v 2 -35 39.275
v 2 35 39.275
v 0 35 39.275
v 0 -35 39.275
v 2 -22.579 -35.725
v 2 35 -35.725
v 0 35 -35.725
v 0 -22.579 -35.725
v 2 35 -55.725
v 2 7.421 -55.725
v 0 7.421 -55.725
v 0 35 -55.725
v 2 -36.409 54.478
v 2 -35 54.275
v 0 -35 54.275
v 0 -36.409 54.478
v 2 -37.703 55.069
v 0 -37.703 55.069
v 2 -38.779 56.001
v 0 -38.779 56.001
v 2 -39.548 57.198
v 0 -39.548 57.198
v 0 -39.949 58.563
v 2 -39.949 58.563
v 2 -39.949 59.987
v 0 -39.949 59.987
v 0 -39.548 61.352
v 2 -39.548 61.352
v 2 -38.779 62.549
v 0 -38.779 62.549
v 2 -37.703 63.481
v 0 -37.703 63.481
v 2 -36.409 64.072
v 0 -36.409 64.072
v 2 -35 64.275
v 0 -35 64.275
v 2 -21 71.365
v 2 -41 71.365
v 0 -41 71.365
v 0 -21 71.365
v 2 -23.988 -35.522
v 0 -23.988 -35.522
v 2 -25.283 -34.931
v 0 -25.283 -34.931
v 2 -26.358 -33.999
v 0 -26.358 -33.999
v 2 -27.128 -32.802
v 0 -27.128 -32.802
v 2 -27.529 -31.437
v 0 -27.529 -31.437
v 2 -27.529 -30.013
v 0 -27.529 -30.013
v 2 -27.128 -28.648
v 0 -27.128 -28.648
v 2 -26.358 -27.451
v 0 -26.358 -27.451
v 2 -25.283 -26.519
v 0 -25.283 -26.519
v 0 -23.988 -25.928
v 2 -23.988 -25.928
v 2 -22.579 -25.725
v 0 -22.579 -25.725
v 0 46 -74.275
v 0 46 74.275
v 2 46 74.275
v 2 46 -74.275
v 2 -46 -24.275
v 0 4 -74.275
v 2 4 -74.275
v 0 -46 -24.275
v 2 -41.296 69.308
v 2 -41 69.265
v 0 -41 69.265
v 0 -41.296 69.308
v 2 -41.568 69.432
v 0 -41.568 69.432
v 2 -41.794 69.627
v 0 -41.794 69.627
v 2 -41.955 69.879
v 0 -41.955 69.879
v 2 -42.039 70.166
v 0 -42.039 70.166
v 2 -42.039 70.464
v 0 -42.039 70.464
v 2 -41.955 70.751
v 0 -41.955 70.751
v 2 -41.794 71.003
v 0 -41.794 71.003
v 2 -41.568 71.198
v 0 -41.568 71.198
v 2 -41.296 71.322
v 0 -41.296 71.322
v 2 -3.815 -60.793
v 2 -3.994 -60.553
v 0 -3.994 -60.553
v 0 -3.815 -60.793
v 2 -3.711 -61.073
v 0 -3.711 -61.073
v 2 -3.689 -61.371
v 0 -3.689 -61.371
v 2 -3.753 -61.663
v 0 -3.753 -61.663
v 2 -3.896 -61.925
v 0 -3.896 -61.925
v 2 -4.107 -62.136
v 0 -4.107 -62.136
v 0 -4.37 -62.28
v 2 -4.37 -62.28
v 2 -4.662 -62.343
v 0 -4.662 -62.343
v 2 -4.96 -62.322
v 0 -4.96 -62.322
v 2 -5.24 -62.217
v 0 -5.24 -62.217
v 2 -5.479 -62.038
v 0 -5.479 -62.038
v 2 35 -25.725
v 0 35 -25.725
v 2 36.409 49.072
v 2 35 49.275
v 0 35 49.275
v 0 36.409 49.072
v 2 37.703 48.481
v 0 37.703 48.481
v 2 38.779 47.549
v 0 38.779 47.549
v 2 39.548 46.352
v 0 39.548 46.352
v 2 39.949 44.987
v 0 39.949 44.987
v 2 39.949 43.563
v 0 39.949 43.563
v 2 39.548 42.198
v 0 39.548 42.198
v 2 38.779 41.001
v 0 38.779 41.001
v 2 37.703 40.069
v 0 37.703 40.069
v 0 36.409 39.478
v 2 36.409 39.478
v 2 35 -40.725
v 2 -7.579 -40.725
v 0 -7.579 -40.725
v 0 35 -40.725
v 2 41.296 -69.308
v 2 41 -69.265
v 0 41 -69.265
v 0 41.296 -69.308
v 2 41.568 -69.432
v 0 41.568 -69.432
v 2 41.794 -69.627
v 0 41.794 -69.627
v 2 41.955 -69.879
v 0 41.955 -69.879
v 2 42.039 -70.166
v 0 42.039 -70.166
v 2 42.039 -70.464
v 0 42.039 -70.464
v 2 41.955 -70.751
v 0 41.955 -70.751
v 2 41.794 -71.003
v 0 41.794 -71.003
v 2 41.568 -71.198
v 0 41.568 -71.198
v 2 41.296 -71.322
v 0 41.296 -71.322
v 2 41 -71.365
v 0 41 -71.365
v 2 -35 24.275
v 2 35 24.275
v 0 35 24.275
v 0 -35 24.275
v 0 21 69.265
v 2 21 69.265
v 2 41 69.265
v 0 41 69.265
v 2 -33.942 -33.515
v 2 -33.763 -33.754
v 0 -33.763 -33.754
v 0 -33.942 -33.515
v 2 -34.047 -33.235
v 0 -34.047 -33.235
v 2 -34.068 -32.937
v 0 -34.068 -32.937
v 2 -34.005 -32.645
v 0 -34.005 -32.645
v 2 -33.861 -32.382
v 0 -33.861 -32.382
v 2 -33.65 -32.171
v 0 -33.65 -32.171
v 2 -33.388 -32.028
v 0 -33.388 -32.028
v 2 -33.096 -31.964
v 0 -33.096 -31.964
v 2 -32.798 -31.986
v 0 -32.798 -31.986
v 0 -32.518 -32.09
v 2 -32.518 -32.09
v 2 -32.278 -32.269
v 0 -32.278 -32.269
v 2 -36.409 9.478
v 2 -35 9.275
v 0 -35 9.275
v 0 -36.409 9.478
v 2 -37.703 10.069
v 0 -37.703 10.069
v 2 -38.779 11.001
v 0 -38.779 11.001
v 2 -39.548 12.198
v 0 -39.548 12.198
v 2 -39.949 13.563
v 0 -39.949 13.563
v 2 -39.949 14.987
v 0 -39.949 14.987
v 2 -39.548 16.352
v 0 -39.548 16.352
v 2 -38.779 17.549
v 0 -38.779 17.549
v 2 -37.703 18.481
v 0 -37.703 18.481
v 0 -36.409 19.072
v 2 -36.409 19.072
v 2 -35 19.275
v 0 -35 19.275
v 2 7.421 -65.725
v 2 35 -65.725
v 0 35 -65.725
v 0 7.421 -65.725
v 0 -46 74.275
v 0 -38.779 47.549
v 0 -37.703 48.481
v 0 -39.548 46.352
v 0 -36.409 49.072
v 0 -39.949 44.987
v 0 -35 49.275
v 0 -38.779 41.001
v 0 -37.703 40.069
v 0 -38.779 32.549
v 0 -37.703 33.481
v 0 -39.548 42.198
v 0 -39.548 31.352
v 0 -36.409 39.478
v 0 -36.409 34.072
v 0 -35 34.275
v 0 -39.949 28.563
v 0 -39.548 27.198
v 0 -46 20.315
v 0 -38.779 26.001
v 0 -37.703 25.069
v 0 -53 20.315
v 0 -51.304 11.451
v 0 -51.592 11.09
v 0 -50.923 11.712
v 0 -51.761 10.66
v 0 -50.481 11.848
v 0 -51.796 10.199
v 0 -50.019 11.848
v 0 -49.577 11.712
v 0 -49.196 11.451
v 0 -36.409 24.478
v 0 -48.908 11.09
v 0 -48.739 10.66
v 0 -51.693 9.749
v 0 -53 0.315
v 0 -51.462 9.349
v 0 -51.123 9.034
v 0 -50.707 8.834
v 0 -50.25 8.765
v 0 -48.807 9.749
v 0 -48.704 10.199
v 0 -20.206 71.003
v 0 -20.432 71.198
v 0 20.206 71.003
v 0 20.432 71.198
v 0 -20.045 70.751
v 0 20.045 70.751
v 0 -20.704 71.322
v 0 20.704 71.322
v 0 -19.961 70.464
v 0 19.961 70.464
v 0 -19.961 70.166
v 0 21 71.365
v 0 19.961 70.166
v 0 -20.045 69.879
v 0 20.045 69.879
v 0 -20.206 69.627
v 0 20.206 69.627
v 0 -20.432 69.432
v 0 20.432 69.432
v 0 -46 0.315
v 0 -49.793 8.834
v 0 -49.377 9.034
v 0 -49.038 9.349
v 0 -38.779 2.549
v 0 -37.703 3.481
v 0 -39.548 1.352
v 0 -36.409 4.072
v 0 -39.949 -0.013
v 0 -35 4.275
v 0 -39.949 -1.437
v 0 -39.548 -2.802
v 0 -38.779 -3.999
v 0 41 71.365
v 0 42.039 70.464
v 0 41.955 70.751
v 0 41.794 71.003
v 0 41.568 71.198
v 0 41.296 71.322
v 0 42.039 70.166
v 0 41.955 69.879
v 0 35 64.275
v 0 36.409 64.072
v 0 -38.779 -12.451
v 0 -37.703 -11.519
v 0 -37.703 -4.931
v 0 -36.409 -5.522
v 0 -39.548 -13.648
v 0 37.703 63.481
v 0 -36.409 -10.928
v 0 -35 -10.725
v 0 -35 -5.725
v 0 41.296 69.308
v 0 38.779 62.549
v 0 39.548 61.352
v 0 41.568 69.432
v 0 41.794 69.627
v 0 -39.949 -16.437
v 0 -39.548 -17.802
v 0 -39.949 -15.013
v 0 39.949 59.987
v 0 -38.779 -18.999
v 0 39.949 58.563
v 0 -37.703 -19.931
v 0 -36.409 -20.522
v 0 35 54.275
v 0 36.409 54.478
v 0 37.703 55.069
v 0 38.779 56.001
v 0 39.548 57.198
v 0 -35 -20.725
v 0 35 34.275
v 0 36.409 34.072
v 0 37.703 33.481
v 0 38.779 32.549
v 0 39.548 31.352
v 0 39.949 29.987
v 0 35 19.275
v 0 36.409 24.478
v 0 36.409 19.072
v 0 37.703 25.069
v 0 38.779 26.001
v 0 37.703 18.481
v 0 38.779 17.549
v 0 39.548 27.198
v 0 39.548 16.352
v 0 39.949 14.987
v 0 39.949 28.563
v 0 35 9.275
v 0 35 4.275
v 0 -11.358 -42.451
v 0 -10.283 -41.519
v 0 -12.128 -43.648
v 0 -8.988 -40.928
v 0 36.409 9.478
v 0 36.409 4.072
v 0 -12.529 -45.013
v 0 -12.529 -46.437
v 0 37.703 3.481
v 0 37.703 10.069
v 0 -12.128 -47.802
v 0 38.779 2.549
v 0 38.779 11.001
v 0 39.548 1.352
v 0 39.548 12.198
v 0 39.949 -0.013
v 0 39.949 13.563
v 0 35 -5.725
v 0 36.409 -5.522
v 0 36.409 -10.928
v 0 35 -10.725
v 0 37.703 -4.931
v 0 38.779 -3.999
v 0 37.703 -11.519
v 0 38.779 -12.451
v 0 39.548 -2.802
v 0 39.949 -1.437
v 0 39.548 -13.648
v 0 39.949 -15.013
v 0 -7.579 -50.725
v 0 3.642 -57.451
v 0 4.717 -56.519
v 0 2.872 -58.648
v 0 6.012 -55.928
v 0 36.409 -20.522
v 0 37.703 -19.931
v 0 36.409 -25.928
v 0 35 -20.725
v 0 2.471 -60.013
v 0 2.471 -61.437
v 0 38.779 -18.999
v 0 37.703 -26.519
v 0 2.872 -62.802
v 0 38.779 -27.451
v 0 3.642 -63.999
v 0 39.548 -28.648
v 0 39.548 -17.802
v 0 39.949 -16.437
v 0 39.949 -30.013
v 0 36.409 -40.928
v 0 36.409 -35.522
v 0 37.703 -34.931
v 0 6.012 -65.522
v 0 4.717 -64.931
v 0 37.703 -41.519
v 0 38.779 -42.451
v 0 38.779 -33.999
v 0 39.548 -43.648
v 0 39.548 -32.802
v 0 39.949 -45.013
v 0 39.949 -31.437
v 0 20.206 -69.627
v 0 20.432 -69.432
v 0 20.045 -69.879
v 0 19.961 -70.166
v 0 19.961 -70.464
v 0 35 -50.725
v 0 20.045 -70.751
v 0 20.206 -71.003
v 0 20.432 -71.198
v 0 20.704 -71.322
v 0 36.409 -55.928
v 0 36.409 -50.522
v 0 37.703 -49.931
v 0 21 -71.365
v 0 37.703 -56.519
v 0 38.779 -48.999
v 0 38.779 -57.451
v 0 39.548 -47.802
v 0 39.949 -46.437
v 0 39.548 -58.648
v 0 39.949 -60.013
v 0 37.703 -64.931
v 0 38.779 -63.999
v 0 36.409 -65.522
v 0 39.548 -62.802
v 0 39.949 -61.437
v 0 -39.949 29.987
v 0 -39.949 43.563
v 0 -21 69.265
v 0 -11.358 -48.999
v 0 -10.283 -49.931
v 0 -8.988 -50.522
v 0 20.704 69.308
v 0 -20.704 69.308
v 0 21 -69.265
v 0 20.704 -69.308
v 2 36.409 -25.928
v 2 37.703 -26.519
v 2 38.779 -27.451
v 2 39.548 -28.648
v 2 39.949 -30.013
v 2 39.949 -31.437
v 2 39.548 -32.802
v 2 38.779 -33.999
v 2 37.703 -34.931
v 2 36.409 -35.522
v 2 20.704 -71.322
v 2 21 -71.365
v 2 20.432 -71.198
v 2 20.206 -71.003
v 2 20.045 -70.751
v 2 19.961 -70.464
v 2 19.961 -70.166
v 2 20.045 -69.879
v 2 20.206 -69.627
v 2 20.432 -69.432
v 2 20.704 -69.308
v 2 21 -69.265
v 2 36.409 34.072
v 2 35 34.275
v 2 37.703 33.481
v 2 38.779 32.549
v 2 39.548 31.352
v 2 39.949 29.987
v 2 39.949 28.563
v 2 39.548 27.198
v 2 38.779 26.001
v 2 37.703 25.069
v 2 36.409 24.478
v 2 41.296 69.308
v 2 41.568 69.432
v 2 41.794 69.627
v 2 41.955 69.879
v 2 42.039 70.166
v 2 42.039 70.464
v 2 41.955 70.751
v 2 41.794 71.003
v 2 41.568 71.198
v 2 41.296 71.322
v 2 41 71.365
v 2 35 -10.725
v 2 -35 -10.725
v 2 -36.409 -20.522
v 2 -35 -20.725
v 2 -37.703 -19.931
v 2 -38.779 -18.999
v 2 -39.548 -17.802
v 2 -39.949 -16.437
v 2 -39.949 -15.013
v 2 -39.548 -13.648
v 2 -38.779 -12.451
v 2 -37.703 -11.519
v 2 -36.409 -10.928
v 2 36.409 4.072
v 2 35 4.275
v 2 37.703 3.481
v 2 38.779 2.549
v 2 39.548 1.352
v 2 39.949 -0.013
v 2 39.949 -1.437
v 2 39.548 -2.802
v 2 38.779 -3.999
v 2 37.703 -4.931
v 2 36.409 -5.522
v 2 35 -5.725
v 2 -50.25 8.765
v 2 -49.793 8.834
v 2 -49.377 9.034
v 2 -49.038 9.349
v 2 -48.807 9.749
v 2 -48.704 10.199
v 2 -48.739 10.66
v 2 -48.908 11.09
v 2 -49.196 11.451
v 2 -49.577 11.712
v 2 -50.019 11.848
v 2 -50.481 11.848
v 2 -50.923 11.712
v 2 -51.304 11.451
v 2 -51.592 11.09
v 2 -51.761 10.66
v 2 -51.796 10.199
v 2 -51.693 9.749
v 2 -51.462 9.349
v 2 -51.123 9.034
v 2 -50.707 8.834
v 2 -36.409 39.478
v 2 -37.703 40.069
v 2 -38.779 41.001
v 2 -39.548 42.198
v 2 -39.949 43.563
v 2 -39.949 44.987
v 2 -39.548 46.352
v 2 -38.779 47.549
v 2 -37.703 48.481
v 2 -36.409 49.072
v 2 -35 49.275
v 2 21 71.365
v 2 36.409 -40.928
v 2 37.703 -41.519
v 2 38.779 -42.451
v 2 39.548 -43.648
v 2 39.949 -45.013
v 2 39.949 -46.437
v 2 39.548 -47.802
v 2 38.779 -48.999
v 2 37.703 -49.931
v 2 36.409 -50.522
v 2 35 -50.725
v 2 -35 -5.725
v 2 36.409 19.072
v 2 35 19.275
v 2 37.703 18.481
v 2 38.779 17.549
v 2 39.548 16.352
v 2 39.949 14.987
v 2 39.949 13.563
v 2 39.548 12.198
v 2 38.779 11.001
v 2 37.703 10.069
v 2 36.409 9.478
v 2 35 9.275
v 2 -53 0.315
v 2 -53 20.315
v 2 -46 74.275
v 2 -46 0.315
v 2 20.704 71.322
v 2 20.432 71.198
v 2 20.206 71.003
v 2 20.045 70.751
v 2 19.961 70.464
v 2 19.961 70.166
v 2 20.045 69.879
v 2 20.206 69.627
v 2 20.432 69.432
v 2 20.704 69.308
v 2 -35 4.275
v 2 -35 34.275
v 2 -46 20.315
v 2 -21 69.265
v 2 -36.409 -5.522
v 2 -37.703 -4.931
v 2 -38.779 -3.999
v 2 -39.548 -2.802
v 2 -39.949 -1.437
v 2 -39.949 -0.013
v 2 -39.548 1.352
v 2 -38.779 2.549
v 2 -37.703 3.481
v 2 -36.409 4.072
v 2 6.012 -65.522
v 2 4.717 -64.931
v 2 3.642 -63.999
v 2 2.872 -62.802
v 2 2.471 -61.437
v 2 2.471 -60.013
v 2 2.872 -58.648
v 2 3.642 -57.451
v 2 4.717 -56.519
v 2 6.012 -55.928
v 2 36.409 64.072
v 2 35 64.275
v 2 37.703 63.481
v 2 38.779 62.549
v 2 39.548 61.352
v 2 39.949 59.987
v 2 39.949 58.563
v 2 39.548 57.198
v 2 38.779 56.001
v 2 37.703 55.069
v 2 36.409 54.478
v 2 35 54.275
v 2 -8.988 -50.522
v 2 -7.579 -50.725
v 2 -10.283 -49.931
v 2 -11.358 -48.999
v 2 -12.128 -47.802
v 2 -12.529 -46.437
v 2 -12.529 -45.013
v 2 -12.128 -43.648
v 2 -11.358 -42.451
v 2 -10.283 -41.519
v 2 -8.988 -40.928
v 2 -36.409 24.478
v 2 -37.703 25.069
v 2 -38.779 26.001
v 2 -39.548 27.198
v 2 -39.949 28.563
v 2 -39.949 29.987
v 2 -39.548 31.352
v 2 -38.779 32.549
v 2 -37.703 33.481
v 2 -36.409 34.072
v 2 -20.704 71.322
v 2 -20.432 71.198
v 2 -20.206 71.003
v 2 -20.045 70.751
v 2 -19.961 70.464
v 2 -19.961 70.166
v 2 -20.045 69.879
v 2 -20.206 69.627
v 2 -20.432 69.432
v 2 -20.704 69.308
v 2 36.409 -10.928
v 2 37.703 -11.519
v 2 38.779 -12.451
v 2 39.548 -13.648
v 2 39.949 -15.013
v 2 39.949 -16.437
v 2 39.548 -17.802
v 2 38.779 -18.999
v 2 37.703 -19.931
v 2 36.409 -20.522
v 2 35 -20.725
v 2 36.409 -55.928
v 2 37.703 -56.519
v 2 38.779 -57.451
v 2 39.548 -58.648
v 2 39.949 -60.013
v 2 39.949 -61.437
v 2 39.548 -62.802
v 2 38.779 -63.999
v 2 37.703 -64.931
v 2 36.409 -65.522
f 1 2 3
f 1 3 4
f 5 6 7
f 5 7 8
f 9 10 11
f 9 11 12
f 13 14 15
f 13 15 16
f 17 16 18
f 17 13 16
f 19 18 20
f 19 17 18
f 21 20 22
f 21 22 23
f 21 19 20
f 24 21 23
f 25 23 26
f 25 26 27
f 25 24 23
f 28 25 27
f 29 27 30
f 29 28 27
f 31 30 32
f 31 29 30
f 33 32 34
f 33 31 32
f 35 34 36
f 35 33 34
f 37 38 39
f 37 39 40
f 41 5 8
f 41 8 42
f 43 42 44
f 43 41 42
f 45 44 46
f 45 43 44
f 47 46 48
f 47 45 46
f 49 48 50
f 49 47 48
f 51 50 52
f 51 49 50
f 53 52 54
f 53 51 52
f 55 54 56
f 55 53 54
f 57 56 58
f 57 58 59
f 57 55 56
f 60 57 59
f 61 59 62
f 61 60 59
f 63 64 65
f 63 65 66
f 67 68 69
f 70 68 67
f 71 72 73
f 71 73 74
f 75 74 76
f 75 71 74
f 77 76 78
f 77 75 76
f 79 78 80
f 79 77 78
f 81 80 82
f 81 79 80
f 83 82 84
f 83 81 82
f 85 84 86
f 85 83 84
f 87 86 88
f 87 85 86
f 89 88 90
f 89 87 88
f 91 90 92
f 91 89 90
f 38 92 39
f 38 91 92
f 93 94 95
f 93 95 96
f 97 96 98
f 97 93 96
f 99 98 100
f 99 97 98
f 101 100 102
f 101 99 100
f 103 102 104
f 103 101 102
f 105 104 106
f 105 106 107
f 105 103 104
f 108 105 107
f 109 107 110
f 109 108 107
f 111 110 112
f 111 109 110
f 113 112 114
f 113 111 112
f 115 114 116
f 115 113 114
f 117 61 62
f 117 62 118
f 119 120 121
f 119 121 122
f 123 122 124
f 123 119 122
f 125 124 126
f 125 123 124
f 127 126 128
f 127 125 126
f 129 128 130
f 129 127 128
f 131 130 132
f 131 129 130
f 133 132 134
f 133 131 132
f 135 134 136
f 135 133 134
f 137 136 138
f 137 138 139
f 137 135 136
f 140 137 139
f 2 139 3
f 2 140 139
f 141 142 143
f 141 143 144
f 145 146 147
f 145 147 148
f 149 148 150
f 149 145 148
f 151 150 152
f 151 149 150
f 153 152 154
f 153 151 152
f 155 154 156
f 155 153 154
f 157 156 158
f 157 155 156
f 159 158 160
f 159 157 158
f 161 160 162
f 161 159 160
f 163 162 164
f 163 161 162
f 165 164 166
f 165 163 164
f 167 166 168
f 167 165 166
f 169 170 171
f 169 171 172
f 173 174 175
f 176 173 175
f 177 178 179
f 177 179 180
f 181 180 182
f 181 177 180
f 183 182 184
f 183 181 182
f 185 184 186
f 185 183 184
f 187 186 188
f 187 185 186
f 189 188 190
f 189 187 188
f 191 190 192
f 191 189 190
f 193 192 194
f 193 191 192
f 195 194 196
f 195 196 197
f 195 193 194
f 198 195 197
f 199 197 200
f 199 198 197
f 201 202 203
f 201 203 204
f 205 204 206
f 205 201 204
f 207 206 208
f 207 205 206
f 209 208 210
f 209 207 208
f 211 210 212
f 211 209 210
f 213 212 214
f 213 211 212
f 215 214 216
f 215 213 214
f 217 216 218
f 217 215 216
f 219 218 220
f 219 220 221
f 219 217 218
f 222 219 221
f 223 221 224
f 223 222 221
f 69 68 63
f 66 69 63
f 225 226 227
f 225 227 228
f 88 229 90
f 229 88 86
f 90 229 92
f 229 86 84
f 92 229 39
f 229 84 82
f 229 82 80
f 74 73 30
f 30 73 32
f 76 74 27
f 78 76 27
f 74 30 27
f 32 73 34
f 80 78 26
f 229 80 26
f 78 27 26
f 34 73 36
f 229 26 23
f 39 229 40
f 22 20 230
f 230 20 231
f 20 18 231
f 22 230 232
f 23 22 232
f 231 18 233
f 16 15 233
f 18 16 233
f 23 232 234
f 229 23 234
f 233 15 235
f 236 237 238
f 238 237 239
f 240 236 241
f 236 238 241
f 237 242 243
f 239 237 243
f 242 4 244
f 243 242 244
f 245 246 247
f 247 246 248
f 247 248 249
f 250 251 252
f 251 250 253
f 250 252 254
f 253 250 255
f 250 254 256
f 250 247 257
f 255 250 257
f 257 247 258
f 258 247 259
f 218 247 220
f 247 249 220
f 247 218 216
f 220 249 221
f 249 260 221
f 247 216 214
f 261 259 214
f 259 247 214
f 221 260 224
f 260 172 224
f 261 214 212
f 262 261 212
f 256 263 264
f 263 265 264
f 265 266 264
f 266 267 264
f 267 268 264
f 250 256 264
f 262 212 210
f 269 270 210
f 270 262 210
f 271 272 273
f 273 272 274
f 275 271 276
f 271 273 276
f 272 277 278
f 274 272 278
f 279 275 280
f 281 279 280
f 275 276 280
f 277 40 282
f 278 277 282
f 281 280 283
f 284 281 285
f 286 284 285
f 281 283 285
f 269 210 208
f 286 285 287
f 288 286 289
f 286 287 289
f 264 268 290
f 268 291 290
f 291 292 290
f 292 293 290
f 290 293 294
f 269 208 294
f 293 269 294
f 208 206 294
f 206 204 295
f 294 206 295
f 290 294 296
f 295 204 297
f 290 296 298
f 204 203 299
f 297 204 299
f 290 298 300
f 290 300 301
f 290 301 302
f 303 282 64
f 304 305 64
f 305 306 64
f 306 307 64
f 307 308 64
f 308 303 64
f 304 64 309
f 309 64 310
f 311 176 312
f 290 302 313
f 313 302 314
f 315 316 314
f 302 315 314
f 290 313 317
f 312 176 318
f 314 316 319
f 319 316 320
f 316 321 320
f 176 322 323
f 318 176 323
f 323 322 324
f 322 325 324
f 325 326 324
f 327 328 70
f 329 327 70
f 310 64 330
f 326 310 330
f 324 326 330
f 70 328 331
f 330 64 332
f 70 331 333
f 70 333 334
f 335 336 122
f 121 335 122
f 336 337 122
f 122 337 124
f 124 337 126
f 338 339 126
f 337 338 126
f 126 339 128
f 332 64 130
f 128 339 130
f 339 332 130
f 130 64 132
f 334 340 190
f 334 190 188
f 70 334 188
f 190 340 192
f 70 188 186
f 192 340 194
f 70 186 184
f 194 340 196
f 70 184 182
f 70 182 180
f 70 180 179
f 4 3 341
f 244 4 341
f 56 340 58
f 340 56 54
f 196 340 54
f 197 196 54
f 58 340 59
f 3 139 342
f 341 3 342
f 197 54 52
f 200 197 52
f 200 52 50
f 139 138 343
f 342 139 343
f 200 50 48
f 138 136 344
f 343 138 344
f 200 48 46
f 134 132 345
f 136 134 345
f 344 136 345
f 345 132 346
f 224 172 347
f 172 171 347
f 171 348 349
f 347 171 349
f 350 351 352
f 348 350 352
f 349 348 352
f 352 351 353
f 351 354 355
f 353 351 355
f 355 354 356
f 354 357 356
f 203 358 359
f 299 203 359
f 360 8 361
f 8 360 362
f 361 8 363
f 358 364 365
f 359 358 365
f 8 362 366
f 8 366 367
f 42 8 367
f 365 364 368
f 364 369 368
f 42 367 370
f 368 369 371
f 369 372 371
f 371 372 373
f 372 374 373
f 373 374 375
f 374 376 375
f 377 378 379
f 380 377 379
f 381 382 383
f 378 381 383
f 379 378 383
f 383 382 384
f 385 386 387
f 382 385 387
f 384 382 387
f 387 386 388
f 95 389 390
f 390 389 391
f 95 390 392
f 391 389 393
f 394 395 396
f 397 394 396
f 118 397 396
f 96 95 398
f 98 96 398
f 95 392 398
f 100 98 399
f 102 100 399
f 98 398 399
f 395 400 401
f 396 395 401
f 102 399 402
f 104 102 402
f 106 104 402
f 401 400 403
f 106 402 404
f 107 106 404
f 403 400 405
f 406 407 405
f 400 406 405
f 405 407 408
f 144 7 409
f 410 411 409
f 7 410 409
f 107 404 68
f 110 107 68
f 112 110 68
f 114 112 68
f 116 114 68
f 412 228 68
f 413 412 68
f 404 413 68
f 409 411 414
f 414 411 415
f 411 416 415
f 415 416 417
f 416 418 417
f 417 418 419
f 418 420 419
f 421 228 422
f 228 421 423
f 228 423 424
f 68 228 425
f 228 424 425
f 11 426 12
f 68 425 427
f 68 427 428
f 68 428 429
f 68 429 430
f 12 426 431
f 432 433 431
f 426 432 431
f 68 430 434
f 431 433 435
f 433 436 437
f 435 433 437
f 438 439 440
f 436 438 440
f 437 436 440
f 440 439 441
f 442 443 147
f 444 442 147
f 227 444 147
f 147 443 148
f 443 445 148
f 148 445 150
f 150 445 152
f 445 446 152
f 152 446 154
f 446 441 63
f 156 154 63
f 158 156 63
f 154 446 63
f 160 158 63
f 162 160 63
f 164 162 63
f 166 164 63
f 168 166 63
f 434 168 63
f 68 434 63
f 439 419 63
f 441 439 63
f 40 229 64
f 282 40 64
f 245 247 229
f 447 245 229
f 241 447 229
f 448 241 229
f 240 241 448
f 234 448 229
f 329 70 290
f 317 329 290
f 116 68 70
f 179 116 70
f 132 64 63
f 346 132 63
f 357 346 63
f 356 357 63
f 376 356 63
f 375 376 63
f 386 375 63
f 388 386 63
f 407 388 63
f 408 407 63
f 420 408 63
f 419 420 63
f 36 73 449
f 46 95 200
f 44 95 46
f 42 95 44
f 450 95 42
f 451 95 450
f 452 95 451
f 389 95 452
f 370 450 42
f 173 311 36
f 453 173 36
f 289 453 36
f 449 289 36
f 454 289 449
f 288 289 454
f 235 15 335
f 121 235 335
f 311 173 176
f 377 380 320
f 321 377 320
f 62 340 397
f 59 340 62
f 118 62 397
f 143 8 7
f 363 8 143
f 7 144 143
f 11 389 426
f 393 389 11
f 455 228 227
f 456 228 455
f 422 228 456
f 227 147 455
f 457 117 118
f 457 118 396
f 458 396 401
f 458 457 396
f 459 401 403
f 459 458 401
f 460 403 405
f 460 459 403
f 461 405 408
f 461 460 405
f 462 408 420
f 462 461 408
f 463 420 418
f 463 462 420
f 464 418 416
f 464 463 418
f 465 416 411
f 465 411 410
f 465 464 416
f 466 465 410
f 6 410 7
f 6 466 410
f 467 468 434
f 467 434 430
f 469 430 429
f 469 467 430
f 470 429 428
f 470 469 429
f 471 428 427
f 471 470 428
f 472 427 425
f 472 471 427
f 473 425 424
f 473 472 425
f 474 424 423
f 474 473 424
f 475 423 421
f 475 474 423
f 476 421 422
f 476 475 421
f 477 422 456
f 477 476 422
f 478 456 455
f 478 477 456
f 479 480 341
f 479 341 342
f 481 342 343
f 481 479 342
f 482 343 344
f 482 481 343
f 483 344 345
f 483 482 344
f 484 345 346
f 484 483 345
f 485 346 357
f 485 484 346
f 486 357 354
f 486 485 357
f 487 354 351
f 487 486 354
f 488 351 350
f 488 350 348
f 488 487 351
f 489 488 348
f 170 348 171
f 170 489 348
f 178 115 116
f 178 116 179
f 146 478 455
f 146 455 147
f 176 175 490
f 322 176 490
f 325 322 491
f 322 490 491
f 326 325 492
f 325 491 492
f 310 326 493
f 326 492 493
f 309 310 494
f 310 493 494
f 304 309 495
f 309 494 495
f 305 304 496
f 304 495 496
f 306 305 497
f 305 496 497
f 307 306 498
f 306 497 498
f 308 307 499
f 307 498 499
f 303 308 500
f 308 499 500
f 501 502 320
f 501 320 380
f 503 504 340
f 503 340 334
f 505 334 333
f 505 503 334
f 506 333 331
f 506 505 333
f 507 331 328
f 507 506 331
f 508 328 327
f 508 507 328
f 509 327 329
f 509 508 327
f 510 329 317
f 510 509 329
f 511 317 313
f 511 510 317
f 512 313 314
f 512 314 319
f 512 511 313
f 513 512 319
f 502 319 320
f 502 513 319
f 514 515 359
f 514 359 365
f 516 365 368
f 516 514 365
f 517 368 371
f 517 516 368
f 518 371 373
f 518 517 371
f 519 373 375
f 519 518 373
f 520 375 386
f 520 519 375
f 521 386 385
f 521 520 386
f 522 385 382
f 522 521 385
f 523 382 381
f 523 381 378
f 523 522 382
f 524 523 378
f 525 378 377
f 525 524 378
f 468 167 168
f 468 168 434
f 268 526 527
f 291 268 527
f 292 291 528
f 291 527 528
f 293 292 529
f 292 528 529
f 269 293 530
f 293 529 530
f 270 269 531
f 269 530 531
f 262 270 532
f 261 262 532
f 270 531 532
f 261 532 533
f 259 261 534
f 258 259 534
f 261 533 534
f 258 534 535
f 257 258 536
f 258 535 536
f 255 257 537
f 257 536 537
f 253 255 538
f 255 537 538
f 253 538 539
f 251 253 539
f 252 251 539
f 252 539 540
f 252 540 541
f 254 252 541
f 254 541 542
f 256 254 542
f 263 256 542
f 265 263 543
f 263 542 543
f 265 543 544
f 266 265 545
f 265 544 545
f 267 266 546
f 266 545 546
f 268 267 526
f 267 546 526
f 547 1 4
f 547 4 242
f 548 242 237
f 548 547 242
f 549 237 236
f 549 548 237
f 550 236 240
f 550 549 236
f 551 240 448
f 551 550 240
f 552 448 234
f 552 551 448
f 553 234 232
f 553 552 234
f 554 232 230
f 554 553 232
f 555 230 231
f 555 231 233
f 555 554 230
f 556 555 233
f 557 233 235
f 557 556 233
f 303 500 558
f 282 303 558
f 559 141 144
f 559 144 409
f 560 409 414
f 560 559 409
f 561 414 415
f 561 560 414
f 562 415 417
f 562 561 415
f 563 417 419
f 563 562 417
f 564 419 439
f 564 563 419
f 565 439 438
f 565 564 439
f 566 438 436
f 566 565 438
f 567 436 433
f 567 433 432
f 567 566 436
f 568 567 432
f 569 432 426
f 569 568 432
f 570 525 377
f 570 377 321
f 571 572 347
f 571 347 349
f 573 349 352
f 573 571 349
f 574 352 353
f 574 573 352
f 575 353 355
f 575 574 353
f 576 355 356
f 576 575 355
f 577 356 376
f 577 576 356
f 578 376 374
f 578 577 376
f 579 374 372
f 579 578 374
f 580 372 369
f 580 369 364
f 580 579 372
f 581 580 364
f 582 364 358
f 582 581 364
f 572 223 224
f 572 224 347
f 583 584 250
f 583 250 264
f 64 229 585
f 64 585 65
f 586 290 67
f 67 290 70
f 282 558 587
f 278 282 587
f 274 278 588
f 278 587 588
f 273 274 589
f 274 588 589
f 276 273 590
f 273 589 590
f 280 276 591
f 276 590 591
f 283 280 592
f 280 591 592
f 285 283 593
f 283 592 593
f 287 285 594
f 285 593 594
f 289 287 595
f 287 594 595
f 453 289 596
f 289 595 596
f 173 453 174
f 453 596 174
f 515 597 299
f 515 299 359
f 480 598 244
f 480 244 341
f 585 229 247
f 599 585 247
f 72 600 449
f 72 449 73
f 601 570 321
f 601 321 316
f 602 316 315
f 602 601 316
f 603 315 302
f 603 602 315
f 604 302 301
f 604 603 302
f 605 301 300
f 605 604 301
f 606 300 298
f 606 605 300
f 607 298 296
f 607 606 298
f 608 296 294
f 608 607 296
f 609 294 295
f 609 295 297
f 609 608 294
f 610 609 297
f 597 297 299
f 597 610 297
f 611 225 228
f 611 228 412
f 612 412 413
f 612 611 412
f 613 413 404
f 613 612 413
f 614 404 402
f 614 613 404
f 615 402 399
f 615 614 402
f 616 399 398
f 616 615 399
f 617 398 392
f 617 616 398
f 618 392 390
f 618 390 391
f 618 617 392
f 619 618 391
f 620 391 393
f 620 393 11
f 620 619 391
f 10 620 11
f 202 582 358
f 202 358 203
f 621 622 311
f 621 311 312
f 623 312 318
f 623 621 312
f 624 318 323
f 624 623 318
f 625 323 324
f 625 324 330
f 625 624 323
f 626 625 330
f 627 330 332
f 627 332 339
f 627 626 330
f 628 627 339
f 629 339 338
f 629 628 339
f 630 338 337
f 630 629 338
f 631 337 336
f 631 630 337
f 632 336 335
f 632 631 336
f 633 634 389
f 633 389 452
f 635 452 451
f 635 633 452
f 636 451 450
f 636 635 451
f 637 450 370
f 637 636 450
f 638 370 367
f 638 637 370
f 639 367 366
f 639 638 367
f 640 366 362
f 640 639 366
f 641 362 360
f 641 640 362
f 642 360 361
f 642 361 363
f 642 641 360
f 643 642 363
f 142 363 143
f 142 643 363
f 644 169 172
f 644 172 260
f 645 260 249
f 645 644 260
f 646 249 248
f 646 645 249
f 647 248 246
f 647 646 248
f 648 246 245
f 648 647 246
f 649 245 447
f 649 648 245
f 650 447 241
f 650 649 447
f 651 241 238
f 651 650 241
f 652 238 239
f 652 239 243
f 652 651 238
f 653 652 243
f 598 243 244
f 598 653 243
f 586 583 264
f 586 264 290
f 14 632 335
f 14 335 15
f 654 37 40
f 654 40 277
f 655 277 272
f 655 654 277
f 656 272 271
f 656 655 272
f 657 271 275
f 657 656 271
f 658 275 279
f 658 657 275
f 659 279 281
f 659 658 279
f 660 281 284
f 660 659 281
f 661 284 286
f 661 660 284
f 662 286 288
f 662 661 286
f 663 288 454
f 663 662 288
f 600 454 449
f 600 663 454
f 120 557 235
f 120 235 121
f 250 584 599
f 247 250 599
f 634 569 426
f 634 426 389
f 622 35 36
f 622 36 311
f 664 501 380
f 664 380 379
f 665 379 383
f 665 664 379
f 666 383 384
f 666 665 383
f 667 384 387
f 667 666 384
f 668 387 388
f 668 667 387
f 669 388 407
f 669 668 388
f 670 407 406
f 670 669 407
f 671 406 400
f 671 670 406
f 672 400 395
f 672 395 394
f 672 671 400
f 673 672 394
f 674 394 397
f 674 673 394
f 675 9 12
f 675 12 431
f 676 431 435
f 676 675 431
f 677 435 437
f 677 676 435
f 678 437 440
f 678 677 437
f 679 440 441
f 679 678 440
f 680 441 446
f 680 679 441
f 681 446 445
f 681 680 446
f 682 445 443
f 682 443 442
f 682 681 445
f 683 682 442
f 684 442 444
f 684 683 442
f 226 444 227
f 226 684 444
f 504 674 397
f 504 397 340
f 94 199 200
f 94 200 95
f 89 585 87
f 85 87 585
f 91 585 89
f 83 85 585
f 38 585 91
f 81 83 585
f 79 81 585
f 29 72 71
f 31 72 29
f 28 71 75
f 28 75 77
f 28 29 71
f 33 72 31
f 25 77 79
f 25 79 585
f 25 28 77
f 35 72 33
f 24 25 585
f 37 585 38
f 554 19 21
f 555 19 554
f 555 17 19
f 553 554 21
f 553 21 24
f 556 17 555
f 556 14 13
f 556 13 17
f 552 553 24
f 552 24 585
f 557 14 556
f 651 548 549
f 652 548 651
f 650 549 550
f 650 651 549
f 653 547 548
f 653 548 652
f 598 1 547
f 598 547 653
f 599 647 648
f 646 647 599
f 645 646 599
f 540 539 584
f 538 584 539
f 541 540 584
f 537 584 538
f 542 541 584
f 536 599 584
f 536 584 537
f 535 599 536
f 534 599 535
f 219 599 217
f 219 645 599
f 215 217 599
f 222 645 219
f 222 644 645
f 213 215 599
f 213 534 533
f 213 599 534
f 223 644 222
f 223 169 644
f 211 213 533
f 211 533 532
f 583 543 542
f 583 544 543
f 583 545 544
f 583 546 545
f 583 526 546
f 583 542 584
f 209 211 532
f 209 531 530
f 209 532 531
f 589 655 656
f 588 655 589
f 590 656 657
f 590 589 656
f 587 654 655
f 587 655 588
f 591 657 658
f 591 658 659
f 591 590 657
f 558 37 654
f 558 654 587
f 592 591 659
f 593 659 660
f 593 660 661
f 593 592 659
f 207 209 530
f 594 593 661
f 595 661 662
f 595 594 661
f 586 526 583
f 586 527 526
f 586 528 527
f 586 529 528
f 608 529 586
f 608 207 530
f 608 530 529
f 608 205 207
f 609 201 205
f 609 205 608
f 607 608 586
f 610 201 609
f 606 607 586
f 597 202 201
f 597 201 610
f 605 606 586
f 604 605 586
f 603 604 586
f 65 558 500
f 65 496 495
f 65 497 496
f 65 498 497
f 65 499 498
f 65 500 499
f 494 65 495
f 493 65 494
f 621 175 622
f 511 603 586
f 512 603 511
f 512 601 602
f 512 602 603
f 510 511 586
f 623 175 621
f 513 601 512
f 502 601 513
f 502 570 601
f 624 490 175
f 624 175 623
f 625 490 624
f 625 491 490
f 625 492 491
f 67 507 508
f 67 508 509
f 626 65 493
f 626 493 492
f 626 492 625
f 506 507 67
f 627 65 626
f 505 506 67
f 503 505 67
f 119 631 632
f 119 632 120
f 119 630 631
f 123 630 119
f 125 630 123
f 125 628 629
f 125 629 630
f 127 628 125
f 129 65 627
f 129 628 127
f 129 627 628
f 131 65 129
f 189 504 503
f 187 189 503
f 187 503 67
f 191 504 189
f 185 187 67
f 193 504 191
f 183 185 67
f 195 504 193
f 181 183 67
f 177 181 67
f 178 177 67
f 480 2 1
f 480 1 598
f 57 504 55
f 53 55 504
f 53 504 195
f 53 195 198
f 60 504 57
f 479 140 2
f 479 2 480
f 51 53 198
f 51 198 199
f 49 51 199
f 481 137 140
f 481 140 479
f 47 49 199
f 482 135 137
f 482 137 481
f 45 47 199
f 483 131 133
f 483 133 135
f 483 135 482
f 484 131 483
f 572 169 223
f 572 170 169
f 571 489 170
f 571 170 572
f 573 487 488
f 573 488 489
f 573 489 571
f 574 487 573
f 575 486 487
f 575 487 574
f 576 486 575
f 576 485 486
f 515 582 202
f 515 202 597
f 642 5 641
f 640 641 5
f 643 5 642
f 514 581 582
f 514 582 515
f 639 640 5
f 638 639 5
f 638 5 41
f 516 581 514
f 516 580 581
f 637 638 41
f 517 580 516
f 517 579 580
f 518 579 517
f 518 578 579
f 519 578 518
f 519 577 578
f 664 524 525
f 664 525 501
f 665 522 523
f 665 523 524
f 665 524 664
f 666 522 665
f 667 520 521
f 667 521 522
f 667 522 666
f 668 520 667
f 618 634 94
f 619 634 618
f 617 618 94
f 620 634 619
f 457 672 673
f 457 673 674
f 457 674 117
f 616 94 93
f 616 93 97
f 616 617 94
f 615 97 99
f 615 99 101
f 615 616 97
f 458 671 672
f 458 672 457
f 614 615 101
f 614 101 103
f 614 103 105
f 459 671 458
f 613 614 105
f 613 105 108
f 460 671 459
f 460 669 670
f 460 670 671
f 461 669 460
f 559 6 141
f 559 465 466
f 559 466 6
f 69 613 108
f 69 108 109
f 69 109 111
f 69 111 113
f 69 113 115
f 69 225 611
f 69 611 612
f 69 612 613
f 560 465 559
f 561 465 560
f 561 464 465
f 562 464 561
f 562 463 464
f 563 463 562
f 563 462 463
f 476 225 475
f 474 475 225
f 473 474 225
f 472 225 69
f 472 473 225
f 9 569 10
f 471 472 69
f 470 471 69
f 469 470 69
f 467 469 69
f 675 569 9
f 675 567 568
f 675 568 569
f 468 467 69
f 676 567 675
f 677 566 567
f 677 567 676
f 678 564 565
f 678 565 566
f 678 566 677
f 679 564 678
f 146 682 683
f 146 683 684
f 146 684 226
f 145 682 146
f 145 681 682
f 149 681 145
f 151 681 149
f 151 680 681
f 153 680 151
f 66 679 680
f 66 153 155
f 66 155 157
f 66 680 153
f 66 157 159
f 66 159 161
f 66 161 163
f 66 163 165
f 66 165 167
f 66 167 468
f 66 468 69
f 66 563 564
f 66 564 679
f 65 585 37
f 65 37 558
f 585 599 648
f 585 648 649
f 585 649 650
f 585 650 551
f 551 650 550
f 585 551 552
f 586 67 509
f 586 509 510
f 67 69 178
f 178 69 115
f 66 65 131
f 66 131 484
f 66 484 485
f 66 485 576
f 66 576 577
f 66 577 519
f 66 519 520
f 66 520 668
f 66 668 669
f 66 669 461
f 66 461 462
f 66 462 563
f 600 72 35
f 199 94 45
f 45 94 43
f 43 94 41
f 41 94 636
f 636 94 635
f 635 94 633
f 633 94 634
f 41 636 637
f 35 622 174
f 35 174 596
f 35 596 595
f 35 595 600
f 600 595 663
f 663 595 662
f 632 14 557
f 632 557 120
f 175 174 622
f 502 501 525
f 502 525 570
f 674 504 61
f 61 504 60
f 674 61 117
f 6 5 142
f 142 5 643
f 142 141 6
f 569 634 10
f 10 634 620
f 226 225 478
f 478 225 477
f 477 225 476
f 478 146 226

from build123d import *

# Parameters (mm, degrees)
SKETCH_2_W               = 148.55
SKETCH_2_H               = 92
EXTRUDE_1_DEPTH          = 2
CUT_EXTRUDE_1_DEPTH      = 88.388647003
CUT_EXTRUDE_1_DEPTH_BACK = 2
CUT_EXTRUDE_2_DEPTH      = 2
SKETCH_5_W               = 20
SKETCH_5_H               = 7
SKETCH_5_R               = 1.55
EXTRUDE_2_DEPTH          = 2
CUT_EXTRUDE_3_DEPTH      = 2
CUT_EXTRUDE_5_DEPTH      = 2


with BuildPart() as part:
    # 草图2 → 凸台-拉伸1 (new body)
    with BuildSketch(Plane(origin=(0, 0, 0), x_dir=(0, 0, -1), z_dir=(1, 0, 0))):
        Rectangle(SKETCH_2_W, SKETCH_2_H)
    extrude(amount=EXTRUDE_1_DEPTH)

    # 草图3 → 切除-拉伸1 (cut, two sides: drawn at the far end of the back side and taken through both)
    with BuildSketch(Plane(origin=(2, 0, 0), x_dir=(0, 0, -1), z_dir=(1, 0, 0)).offset(-CUT_EXTRUDE_1_DEPTH_BACK)):
        Polygon((-204.458434938, -274.733434938), (24.275, -46), (74.275, 4), (303.008434938, 232.733434938), (760.475304814, -224.733434938), (253.008434938, -732.200304814), align=None)
    extrude(amount=CUT_EXTRUDE_1_DEPTH + CUT_EXTRUDE_1_DEPTH_BACK, mode=Mode.SUBTRACT)

    # 草图4 → 切除-拉伸2 (cut)
    with BuildSketch(Plane(origin=(2, 0, 0), x_dir=(0, 0, -1), z_dir=(1, 0, 0))):
        with BuildLine():
            Line((-71.365, -41), (-71.365, -21))
            ThreePointArc((-71.365, -21), (-70.315, -19.95), (-69.265, -21))
            Line((-69.265, -21), (-69.265, -41))
            ThreePointArc((-69.265, -41), (-70.315, -42.05), (-71.365, -41))
        make_face()
        with BuildLine():
            Line((-71.365, 41), (-71.365, 21))
            ThreePointArc((-71.365, 21), (-70.315, 19.95), (-69.265, 21))
            Line((-69.265, 21), (-69.265, 41))
            ThreePointArc((-69.265, 41), (-70.315, 42.05), (-71.365, 41))
        make_face()
        with BuildLine():
            Line((71.365, 41), (71.365, 21))
            ThreePointArc((71.365, 21), (70.315, 19.95), (69.265, 21))
            Line((69.265, 21), (69.265, 41))
            ThreePointArc((69.265, 41), (70.315, 42.05), (71.365, 41))
        make_face()
    extrude(amount=-CUT_EXTRUDE_2_DEPTH, mode=Mode.SUBTRACT)

    # 草图5 → 凸台-拉伸2 (add)
    with BuildSketch(Plane(origin=(2, 0, 0), x_dir=(0, 0, -1), z_dir=(1, 0, 0))):
        with Locations((-10.315, -49.5)):
            Rectangle(SKETCH_5_W, SKETCH_5_H)
        with Locations((-10.315, -50.25)):
            Circle(SKETCH_5_R, mode=Mode.SUBTRACT)
    extrude(amount=-EXTRUDE_2_DEPTH)

    # 草图6 → 切除-拉伸3 (cut)
    with BuildSketch(Plane(origin=(2, 0, 0), x_dir=(0, 0, -1), z_dir=(1, 0, 0))):
        with BuildLine():
            Line((-64.275, -35), (-64.275, 35))
            ThreePointArc((-64.275, 35), (-59.275, 40), (-54.275, 35))
            Line((-54.275, 35), (-54.275, -35))
            ThreePointArc((-54.275, -35), (-59.275, -40), (-64.275, -35))
        make_face()
        with BuildLine():
            Line((-49.275, -35), (-49.275, 35))
            ThreePointArc((-49.275, 35), (-44.275, 40), (-39.275, 35))
            Line((-39.275, 35), (-39.275, -35))
            ThreePointArc((-39.275, -35), (-44.275, -40), (-49.275, -35))
        make_face()
        with BuildLine():
            Line((-34.275, -35), (-34.275, 35))
            ThreePointArc((-34.275, 35), (-29.275, 40), (-24.275, 35))
            Line((-24.275, 35), (-24.275, -35))
            ThreePointArc((-24.275, -35), (-29.275, -40), (-34.275, -35))
        make_face()
        with BuildLine():
            Line((-19.275, -35), (-19.275, 35))
            ThreePointArc((-19.275, 35), (-14.275, 40), (-9.275, 35))
            Line((-9.275, 35), (-9.275, -35))
            ThreePointArc((-9.275, -35), (-14.275, -40), (-19.275, -35))
        make_face()
        with BuildLine():
            Line((-4.275, -35), (-4.275, 35))
            ThreePointArc((-4.275, 35), (0.725, 40), (5.725, 35))
            Line((5.725, 35), (5.725, -35))
            ThreePointArc((5.725, -35), (0.725, -40), (-4.275, -35))
        make_face()
        with BuildLine():
            Line((10.725, -35), (10.725, 35))
            ThreePointArc((10.725, 35), (15.725, 40), (20.725, 35))
            Line((20.725, 35), (20.725, -35))
            ThreePointArc((20.725, -35), (15.725, -40), (10.725, -35))
        make_face()
        with BuildLine():
            Line((25.725, -22.579437252), (25.725, 35))
            ThreePointArc((25.725, 35), (30.725, 40), (35.725, 35))
            Line((35.725, 35), (35.725, -22.579437252))
            ThreePointArc((35.725, -22.579437252), (30.725, -27.579437252), (25.725, -22.579437252))
        make_face()
        with BuildLine():
            Line((40.725, -7.579437252), (40.725, 35))
            ThreePointArc((40.725, 35), (45.725, 40), (50.725, 35))
            Line((50.725, 35), (50.725, -7.579437252))
            ThreePointArc((50.725, -7.579437252), (45.725, -12.579437252), (40.725, -7.579437252))
        make_face()
        with BuildLine():
            Line((55.725, 7.420562748), (55.725, 35))
            ThreePointArc((55.725, 35), (60.725, 40), (65.725, 35))
            Line((65.725, 35), (65.725, 7.420562748))
            ThreePointArc((65.725, 7.420562748), (60.725, 2.420562748), (55.725, 7.420562748))
        make_face()
    extrude(amount=-CUT_EXTRUDE_3_DEPTH, mode=Mode.SUBTRACT)

    # 草图9 → 切除-拉伸5 (cut)
    with BuildSketch(Plane(origin=(2, 0, 0), x_dir=(0, 0, -1), z_dir=(1, 0, 0))):
        with BuildLine():
            Line((32.269081912, -32.27835316), (60.55335316, -3.994081912))
            ThreePointArc((60.55335316, -3.994081912), (62.0382774, -3.994081912), (62.0382774, -5.479006153))
            Line((62.0382774, -5.479006153), (33.754006153, -33.7632774))
            ThreePointArc((33.754006153, -33.7632774), (32.269081912, -33.7632774), (32.269081912, -32.27835316))
        make_face()
    extrude(amount=-CUT_EXTRUDE_5_DEPTH, mode=Mode.SUBTRACT)


solid = part.part
